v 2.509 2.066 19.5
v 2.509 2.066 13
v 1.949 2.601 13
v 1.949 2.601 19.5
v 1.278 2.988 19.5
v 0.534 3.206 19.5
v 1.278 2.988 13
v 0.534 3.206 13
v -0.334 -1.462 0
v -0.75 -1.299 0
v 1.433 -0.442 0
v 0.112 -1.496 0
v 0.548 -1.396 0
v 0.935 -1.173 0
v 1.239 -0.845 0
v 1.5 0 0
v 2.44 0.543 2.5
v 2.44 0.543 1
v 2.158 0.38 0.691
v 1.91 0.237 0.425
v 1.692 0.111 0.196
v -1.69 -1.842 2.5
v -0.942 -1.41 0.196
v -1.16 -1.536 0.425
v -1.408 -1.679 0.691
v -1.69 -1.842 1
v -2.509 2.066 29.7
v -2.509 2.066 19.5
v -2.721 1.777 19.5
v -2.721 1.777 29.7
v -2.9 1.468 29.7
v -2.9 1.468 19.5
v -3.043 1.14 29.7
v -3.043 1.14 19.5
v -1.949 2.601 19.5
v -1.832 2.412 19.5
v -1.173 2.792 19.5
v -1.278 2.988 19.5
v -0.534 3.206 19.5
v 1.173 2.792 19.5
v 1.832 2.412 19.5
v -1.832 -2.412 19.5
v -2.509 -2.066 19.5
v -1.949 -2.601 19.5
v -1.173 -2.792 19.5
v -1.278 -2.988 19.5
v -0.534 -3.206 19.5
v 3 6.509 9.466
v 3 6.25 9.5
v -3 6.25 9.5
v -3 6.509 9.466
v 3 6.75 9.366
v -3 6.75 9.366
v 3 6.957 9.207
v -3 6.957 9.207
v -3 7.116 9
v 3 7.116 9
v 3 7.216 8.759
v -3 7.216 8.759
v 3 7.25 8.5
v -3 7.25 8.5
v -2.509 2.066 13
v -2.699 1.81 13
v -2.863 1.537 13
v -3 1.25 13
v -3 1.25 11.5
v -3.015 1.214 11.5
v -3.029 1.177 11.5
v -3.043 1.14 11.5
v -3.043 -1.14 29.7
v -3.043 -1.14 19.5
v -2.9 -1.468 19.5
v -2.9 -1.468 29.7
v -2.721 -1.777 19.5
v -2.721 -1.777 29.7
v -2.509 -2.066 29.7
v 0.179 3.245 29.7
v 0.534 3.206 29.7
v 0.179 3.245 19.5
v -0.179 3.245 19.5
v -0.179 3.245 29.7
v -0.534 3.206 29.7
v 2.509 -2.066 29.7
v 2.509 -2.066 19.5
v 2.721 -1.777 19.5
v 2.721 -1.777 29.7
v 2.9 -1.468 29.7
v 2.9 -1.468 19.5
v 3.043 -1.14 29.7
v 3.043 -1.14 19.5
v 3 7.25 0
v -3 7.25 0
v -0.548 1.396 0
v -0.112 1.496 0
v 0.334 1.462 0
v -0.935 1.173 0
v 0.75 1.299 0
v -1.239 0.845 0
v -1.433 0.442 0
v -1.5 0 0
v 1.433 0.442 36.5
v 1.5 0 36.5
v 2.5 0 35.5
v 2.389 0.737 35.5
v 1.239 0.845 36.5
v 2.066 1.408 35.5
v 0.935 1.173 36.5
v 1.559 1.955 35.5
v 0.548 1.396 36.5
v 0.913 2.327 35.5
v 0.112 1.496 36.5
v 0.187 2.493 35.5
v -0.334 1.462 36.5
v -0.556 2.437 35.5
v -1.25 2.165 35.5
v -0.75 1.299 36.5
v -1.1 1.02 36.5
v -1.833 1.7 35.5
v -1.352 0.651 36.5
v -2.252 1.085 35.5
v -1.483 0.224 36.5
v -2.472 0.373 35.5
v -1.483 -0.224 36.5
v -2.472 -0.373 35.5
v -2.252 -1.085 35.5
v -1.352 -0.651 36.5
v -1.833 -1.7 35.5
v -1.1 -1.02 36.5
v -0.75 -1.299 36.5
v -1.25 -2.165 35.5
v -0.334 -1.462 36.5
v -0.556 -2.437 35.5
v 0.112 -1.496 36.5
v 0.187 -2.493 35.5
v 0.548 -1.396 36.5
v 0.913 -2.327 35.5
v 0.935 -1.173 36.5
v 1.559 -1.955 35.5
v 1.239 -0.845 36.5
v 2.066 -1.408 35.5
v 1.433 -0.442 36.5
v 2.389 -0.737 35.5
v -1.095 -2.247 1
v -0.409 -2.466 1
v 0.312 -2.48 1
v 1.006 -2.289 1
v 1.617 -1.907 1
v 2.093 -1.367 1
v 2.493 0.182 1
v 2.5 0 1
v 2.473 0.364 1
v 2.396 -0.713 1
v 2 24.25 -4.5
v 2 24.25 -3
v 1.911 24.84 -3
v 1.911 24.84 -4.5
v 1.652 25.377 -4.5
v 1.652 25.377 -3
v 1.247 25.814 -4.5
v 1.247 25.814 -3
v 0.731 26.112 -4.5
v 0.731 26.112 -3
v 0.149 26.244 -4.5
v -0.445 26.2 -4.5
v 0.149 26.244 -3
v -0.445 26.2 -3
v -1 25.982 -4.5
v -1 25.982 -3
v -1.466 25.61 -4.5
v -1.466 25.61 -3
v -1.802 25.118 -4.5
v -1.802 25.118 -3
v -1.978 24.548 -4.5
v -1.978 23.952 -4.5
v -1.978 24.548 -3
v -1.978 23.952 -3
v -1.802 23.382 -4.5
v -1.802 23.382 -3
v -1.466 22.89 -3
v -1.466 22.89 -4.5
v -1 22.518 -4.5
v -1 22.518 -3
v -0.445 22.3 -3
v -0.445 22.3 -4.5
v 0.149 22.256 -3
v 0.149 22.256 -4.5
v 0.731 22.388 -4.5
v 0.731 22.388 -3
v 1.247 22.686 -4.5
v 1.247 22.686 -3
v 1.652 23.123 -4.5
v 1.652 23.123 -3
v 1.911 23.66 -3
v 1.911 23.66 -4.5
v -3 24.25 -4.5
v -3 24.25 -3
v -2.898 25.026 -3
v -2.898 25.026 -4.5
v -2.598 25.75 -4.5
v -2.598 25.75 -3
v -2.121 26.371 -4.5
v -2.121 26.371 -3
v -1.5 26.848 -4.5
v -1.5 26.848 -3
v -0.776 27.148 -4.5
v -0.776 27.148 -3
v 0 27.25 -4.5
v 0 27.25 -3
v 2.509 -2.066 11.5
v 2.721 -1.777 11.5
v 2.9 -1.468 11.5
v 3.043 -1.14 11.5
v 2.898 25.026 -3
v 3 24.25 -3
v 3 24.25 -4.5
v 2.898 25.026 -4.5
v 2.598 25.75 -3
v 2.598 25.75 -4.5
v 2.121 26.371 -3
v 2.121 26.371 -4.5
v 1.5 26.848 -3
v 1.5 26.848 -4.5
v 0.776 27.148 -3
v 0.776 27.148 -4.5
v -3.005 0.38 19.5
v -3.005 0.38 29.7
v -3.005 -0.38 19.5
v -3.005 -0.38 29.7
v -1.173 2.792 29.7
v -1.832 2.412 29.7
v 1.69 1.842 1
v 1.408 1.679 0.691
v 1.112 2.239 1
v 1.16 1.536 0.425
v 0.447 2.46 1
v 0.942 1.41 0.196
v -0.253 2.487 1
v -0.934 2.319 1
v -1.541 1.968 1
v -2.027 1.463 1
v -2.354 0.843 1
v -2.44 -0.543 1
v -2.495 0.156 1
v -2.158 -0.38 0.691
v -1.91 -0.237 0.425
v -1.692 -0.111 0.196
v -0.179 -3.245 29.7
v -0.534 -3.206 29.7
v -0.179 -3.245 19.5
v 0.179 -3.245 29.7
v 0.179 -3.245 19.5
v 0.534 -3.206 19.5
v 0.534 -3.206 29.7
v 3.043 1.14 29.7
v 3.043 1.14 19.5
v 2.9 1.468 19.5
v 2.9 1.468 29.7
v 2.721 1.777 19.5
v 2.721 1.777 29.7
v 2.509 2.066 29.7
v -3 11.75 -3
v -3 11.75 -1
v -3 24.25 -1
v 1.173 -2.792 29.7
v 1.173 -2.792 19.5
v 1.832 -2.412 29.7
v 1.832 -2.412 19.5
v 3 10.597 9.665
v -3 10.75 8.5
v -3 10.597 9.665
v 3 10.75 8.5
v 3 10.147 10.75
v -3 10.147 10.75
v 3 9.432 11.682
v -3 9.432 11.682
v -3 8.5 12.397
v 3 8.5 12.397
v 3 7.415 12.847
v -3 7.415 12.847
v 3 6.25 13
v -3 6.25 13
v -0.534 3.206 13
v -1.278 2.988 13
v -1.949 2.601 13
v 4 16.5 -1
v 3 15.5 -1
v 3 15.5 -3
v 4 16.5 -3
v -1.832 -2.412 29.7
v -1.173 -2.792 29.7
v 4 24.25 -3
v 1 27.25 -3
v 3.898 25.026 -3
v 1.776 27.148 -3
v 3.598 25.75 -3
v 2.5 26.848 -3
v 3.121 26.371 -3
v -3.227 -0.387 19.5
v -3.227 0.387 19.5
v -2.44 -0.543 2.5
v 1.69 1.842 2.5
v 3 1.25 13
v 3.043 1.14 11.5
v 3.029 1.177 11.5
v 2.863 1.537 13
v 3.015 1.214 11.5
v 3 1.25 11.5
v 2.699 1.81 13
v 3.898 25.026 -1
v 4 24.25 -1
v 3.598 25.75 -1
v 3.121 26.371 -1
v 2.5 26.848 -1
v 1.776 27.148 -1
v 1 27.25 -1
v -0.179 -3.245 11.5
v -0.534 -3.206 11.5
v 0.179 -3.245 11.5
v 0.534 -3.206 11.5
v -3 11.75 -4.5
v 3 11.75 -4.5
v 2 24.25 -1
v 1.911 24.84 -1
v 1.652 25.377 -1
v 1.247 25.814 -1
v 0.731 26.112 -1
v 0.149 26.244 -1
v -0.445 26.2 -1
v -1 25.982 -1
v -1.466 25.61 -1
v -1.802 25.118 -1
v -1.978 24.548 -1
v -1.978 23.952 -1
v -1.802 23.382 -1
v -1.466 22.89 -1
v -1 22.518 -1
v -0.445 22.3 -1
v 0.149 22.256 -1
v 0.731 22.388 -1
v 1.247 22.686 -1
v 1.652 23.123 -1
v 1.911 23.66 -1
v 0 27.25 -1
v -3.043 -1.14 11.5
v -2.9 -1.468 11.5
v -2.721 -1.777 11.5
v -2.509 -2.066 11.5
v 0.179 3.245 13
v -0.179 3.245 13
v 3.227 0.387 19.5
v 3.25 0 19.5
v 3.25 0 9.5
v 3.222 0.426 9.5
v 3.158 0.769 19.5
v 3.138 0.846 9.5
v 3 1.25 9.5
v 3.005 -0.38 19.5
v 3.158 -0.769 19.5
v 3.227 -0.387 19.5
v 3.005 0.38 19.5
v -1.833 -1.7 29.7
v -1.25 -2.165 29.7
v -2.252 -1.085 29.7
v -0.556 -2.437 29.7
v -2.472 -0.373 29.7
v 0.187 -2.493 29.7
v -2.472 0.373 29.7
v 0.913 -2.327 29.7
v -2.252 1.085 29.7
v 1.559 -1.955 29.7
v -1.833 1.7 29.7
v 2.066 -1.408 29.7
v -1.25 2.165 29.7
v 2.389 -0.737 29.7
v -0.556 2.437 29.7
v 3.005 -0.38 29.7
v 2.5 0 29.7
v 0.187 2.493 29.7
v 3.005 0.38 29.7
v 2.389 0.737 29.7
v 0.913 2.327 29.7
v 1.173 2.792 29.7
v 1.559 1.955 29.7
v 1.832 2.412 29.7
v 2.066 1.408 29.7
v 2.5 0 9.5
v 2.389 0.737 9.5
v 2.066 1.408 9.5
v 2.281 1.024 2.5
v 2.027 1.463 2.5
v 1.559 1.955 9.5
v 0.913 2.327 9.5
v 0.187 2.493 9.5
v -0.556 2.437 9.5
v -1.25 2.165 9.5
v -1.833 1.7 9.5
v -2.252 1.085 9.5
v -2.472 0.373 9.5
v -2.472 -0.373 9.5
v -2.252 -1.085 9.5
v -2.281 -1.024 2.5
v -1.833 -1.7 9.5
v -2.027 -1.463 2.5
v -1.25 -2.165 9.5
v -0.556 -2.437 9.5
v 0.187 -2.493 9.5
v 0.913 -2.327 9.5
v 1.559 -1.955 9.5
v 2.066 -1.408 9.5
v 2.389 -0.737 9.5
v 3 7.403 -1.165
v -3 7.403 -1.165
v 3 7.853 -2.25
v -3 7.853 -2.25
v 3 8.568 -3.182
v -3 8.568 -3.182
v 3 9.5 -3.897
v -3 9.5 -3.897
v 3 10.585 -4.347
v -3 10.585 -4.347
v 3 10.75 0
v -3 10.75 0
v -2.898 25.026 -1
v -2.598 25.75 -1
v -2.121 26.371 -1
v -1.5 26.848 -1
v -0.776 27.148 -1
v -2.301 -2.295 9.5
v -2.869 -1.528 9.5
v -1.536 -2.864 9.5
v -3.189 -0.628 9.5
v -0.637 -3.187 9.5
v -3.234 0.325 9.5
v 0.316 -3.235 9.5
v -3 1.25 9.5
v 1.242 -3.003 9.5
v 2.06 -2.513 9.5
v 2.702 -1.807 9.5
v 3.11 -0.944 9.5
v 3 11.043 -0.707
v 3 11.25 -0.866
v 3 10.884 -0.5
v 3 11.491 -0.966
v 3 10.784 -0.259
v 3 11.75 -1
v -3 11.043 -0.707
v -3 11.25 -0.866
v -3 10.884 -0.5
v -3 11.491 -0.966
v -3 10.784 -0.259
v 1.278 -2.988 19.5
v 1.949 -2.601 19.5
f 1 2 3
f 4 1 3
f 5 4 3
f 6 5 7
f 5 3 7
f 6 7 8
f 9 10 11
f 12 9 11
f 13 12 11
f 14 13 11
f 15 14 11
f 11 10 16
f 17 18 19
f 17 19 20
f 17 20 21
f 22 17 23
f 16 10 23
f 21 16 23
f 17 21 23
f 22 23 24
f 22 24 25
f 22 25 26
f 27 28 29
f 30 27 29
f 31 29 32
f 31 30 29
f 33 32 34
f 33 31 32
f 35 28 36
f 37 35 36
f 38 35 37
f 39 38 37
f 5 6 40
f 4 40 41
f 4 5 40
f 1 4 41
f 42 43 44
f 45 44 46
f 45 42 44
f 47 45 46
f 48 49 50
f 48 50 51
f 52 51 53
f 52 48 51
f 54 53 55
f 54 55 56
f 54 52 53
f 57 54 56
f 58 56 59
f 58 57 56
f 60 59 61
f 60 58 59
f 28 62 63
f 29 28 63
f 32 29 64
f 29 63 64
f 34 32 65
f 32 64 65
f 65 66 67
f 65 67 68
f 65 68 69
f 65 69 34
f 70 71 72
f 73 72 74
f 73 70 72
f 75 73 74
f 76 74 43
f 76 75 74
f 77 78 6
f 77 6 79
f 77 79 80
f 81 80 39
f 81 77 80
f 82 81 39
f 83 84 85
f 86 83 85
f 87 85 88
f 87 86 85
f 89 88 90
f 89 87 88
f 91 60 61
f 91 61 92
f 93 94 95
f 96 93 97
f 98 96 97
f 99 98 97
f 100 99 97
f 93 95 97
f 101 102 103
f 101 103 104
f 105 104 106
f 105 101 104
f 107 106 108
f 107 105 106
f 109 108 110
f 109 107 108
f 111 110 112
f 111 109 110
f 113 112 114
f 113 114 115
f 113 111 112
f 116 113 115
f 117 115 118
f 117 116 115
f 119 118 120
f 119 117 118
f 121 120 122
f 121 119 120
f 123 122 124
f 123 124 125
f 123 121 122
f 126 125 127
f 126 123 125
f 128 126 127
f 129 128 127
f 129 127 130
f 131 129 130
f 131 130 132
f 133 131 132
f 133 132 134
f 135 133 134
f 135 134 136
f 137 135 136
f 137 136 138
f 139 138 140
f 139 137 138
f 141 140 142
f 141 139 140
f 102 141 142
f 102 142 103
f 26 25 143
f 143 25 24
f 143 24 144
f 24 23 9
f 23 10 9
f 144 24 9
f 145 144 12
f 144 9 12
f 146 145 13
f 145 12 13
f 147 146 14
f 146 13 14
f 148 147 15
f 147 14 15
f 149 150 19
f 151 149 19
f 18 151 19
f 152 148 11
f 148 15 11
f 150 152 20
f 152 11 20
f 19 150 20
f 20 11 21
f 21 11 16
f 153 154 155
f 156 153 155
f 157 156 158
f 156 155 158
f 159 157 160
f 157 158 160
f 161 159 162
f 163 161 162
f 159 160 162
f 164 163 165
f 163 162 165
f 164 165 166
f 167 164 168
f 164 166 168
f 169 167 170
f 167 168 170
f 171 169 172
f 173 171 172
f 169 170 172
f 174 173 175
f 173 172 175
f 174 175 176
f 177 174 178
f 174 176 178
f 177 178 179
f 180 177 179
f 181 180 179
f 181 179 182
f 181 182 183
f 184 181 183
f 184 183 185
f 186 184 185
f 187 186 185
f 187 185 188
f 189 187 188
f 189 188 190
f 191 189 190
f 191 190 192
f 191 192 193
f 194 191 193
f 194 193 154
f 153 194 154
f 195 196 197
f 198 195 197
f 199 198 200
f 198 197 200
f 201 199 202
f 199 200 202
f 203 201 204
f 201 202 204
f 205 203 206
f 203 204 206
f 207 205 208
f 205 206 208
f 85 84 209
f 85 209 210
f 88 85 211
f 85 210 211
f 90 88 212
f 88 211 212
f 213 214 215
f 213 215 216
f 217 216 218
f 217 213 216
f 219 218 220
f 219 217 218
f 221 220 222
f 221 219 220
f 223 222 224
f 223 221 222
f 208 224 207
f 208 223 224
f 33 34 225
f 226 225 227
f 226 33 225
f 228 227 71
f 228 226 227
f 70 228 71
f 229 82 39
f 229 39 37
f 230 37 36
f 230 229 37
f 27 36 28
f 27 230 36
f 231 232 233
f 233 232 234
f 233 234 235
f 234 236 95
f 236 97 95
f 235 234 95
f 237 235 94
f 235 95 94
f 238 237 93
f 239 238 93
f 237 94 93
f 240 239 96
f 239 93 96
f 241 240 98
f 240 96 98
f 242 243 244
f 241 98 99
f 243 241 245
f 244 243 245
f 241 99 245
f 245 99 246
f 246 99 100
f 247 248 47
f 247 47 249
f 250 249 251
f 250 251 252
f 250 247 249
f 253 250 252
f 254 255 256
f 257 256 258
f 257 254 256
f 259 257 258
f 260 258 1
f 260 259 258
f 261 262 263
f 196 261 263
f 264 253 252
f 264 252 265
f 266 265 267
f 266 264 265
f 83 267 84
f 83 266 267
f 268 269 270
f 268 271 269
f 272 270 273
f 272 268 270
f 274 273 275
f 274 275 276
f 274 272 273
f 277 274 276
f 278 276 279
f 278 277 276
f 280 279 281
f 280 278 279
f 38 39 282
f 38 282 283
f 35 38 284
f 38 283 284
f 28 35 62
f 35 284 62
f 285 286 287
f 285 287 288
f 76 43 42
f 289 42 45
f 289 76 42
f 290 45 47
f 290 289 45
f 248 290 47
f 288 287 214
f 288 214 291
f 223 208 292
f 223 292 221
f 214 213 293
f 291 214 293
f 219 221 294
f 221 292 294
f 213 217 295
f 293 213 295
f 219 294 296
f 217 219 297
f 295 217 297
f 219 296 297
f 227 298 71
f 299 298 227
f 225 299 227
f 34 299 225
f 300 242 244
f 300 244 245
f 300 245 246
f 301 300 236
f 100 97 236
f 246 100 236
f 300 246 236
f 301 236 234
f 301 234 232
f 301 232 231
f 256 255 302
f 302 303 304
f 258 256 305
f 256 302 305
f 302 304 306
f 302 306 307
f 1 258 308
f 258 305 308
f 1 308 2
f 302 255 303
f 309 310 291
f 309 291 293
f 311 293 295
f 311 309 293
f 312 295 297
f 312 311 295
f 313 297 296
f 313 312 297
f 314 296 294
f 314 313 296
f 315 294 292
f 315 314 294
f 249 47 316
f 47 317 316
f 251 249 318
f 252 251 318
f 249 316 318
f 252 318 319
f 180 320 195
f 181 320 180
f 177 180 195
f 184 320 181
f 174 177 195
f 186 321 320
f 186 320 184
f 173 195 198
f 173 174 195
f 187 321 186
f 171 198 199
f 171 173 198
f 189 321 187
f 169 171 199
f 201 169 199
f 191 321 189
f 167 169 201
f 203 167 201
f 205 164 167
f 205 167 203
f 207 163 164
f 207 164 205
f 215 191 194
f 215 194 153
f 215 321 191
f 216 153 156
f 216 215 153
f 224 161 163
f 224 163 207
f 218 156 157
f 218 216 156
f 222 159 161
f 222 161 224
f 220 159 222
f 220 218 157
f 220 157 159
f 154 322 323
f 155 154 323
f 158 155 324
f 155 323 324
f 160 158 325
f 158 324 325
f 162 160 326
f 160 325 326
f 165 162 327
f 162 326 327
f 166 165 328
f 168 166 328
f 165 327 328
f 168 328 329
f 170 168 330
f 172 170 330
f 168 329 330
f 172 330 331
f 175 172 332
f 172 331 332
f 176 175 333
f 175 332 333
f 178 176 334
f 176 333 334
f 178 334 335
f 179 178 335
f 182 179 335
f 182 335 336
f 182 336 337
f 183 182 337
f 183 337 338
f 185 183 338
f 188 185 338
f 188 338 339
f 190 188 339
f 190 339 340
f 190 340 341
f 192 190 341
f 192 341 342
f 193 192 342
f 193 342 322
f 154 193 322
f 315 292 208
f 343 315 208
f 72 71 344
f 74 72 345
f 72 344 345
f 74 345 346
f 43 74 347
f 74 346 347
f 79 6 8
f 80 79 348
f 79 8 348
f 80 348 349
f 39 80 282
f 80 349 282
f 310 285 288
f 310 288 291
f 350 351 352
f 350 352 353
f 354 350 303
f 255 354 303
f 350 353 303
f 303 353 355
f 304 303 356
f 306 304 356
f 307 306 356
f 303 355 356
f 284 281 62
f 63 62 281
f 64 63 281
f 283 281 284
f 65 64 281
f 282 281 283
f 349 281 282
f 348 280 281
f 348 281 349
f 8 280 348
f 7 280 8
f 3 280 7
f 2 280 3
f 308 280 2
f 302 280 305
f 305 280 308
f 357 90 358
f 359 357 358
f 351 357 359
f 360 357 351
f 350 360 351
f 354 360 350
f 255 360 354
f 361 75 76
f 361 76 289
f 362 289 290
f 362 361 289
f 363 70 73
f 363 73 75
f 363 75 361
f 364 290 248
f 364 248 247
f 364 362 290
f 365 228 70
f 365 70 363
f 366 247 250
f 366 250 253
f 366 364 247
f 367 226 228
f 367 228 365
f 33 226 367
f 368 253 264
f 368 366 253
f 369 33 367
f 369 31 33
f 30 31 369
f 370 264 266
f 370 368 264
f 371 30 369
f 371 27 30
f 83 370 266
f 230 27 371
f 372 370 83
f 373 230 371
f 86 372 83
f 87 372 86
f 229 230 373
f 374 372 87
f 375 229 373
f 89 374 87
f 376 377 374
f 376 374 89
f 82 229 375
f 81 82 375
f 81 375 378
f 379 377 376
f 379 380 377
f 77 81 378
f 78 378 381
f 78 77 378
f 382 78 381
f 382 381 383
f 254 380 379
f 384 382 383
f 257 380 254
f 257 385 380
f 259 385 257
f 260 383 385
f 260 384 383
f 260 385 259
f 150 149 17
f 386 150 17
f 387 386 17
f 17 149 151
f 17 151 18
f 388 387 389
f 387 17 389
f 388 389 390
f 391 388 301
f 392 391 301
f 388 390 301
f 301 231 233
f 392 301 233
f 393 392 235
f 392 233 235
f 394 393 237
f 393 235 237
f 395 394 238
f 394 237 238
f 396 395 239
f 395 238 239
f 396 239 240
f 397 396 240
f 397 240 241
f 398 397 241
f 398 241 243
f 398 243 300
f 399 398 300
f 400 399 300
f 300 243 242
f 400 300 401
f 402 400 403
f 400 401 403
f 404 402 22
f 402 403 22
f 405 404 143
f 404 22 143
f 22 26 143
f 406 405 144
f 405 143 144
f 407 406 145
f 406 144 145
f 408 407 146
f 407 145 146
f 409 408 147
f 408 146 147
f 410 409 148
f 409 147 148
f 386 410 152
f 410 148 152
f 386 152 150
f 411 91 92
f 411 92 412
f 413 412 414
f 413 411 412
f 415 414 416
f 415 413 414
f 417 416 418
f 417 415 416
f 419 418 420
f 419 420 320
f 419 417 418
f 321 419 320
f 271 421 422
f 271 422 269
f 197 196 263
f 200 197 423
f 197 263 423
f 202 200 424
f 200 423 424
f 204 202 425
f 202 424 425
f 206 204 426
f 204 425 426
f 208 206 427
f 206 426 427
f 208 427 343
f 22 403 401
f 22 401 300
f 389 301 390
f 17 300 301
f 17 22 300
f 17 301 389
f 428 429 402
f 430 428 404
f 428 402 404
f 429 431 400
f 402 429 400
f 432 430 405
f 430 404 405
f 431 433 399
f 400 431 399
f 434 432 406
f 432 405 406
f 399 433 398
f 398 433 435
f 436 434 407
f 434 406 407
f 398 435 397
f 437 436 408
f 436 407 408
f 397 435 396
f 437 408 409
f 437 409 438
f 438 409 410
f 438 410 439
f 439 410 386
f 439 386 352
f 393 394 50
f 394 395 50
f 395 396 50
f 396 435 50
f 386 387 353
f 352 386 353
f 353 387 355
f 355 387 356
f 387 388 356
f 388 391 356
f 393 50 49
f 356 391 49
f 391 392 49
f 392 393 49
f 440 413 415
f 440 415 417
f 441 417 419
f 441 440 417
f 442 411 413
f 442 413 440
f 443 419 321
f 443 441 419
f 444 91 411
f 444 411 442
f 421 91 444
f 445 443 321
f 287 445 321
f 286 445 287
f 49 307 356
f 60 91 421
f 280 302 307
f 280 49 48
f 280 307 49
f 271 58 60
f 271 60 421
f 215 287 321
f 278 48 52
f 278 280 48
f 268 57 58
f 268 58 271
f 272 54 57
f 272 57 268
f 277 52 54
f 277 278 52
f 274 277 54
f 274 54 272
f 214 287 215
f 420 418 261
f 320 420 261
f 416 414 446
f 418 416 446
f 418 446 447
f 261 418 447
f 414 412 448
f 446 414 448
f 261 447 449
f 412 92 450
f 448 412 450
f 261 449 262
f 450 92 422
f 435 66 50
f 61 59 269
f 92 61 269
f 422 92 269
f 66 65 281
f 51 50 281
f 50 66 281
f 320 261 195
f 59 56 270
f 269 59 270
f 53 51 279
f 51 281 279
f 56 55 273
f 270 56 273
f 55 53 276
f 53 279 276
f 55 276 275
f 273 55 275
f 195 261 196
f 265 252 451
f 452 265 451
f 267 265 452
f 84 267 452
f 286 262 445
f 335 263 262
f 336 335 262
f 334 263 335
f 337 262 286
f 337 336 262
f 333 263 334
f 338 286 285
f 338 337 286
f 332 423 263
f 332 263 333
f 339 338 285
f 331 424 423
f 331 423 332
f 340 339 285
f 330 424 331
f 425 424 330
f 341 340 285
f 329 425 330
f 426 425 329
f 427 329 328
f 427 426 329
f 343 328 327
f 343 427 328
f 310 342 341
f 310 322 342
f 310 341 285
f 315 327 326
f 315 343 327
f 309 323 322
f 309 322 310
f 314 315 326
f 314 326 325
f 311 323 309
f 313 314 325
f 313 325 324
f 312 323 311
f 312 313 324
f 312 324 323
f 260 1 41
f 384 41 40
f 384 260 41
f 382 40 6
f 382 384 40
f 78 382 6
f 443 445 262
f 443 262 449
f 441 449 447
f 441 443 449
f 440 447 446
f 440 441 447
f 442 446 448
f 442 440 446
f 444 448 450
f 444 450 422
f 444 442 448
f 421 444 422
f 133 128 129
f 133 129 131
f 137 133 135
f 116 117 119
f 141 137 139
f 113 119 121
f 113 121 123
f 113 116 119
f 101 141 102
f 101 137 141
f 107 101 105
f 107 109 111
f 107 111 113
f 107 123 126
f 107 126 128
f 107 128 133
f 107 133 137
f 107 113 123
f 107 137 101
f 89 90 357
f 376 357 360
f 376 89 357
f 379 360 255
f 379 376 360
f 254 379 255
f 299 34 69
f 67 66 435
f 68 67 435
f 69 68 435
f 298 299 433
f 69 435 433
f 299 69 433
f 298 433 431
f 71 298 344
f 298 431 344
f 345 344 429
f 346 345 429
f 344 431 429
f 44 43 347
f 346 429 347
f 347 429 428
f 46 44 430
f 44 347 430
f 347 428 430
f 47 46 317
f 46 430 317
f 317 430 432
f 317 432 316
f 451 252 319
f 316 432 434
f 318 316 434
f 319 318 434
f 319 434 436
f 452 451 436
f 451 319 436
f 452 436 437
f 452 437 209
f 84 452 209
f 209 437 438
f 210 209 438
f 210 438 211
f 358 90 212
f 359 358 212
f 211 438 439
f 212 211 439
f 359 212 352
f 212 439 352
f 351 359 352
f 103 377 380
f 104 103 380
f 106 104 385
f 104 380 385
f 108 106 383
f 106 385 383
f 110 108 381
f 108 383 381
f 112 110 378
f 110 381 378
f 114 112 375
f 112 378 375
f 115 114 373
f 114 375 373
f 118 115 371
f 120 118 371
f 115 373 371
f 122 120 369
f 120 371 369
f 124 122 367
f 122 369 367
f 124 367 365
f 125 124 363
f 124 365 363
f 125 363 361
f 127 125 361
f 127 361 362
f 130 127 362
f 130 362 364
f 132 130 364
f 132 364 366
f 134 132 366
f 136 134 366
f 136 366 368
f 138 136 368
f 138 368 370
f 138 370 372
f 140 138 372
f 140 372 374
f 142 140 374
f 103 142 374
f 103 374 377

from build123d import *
from build123d import SkipClean  # not in build123d's __all__

# Parameters (mm, degrees)
F0_R      = 2.5
F1_DEPTH  = 36.5
F3_START  = 9.5
F2_R      = 3.25
F3_DEPTH  = 10
F5_DEPTH  = 3
F7_START  = -6.8
F7_DEPTH  = 18.2
F8_R      = 2
F9_DEPTH  = 3.501
F10_R     = 2.99999
F12_DEPTH = 2.5
F13_SIZE  = 0.9999
F14_R     = 2
F15_DEPTH = 2


# Not quite as in the source:
# - a fillet or chamfer is up to 0.001 mm smaller than in the source, because OpenCascade refuses the exact size
# - after a boolean that leaves OpenCascade's solid faulty, fix() repairs it
# - ends of sketch curves that miss each other by under 0.0002 mm in the source are joined


with BuildPart() as f1:
    # F0 (on Top) → F1 (new body)
    with BuildSketch(Plane.XY):
        Circle(F0_R)
    extrude(amount=F1_DEPTH)

    # F2 (on Top) → F3 (join)
    with BuildSketch(Plane.XY.offset(F3_START)):
        Circle(F2_R)
    extrude(amount=F3_DEPTH)

    # F4 (on Right) → F5 (join, symmetric)
    with BuildSketch(Plane.YZ):
        with BuildLine():
            Line((0, 13), (0, 9.5))
            Line((0, 9.5), (6.25, 9.5))
            ThreePointArc((6.25, 9.5), (6.9571067812, 9.2071067812), (7.25, 8.5))
            Line((7.25, 8.5), (7.25, 0))
            ThreePointArc((7.25, 0), (8.5680194847, -3.1819805153), (11.75, -4.5))
            Line((11.75, -4.5), (27.25, -4.5))
            Line((27.25, -4.5), (27.25, -1))
            Line((27.25, -1), (11.75, -1))
            ThreePointArc((11.75, -1), (11.0428932188, -0.7071067812), (10.75, 0))
            Line((10.75, 0), (10.75, 8.5))
            ThreePointArc((10.75, 8.5), (9.4319805153, 11.6819805153), (6.25, 13))
            Line((6.25, 13), (0, 13))
        make_face()
    extrude(amount=F5_DEPTH, both=True)

    # F6 (on face) → F7 (join)
    with BuildSketch(Plane.XY.offset(36.5).offset(F7_START)):
        with BuildLine():
            ThreePointArc((3.0434027778, -1.1402629224), (3, 0), (3.0434027778, 1.1402629224))
            ThreePointArc((3.0434027778, 1.1402629224), (2.8145825623, 1.625), (2.5091980467, 2.0655326583))
            ThreePointArc((2.5091980467, 2.0655326583), (1.5, 2.5980762114), (0.5342047311, 3.2057955807))
            ThreePointArc((0.5342047311, 3.2057955807), (0, 3.25), (-0.5342047311, 3.2057955807))
            ThreePointArc((-0.5342047311, 3.2057955807), (-1.5, 2.5980762114), (-2.5091980467, 2.0655326583))
            ThreePointArc((-2.5091980467, 2.0655326583), (-2.8145825623, 1.625), (-3.0434027778, 1.1402629224))
            ThreePointArc((-3.0434027778, 1.1402629224), (-3, 0), (-3.0434027778, -1.1402629224))
            ThreePointArc((-3.0434027778, -1.1402629224), (-2.8145825623, -1.625), (-2.5091980467, -2.0655326583))
            ThreePointArc((-2.5091980467, -2.0655326583), (-1.5, -2.5980762114), (-0.5342047311, -3.2057955807))
            ThreePointArc((-0.5342047311, -3.2057955807), (0, -3.25), (0.5342047311, -3.2057955807))
            ThreePointArc((0.5342047311, -3.2057955807), (1.5, -2.5980762114), (2.5091980467, -2.0655326583))
            ThreePointArc((2.5091980467, -2.0655326583), (2.8145825623, -1.625), (3.0434027778, -1.1402629224))
        make_face()
    with SkipClean():  # cleaning this boolean's faces spoils the solid; the shape is the same uncleaned
        extrude(amount=-F7_DEPTH)

    # F8 (on face) → F9 (cut, through all)
    with BuildSketch(Plane.XY.offset(-1)):
        with Locations((0, 24.25)):
            Circle(F8_R)
    extrude(amount=-F9_DEPTH, mode=Mode.SUBTRACT)

    add(f1.part.fix(), mode=Mode.REPLACE)

    # F10 (radius 3 in the source; OpenCascade refuses exactly that, so slightly less here)
    f10_edges = [f1.edges().sort_by_distance(p)[0] for p in [
        (-3, 27.25, -2.75),
        (3, 27.25, -2.75),
    ]]
    fillet(f10_edges, radius=F10_R)

    # F11 (on face) → F12 (cut)
    with BuildSketch(Plane(origin=(0, 0, 0), x_dir=(1, 0, 0), z_dir=(0, 0, -1))):
        with BuildLine():
            ThreePointArc((1.6903389552, -1.8419430546), (2.1650635095, -1.25), (2.4403389552, -0.5429049489))
            Line((2.4403389552, -0.5429049489), (-1.6903389552, 1.8419430546))
            ThreePointArc((-1.6903389552, 1.8419430546), (-2.1650635095, 1.25), (-2.4403389552, 0.5429049489))
            Line((-2.4403389552, 0.5429049489), (1.6903389552, -1.8419430546))
        make_face()
    extrude(amount=-F12_DEPTH, mode=Mode.SUBTRACT)

    # F13 (size 1 in the source; OpenCascade refuses exactly that, so slightly less here)
    f13_edges = [f1.edges().sort_by_distance(p)[0] for p in [
        (-1.25, 2.165064, 0),
        (-2.5, 0, 36.5),
        (1.00602, -2.288651, 0),
    ]]
    chamfer(f13_edges, length=F13_SIZE)

    # F14 (on face) → F15 (join)
    with BuildSketch(Plane.XY.offset(-1)):
        with BuildLine():
            Line((3, 24.25), (3, 15.5))
            Line((3, 15.5), (4, 16.5))
            Line((4, 16.5), (4, 24.25))
            ThreePointArc((4, 24.25), (3.1213203436, 26.3713203436), (1, 27.25))
            Line((1, 27.25), (0, 27.25))
            ThreePointArc((0, 27.25), (2.1213203436, 26.3713203436), (3, 24.25))
        make_face()
        with BuildLine():
            Line((3, 11.75), (3, 15.5))
            Line((3, 15.5), (3, 24.25))
            ThreePointArc((3, 24.25), (2.1213203436, 26.3713203436), (0, 27.25))
            ThreePointArc((0, 27.25), (-2.1213232725, 26.3713232725), (-3, 24.25001))
            Line((-3, 24.25001), (-3, 11.75))
            Line((-3, 11.75), (3, 11.75))
        make_face()
        with Locations((0, 24.25)):
            Circle(F14_R, mode=Mode.SUBTRACT)
    extrude(amount=-F15_DEPTH)


solid = f1.part
